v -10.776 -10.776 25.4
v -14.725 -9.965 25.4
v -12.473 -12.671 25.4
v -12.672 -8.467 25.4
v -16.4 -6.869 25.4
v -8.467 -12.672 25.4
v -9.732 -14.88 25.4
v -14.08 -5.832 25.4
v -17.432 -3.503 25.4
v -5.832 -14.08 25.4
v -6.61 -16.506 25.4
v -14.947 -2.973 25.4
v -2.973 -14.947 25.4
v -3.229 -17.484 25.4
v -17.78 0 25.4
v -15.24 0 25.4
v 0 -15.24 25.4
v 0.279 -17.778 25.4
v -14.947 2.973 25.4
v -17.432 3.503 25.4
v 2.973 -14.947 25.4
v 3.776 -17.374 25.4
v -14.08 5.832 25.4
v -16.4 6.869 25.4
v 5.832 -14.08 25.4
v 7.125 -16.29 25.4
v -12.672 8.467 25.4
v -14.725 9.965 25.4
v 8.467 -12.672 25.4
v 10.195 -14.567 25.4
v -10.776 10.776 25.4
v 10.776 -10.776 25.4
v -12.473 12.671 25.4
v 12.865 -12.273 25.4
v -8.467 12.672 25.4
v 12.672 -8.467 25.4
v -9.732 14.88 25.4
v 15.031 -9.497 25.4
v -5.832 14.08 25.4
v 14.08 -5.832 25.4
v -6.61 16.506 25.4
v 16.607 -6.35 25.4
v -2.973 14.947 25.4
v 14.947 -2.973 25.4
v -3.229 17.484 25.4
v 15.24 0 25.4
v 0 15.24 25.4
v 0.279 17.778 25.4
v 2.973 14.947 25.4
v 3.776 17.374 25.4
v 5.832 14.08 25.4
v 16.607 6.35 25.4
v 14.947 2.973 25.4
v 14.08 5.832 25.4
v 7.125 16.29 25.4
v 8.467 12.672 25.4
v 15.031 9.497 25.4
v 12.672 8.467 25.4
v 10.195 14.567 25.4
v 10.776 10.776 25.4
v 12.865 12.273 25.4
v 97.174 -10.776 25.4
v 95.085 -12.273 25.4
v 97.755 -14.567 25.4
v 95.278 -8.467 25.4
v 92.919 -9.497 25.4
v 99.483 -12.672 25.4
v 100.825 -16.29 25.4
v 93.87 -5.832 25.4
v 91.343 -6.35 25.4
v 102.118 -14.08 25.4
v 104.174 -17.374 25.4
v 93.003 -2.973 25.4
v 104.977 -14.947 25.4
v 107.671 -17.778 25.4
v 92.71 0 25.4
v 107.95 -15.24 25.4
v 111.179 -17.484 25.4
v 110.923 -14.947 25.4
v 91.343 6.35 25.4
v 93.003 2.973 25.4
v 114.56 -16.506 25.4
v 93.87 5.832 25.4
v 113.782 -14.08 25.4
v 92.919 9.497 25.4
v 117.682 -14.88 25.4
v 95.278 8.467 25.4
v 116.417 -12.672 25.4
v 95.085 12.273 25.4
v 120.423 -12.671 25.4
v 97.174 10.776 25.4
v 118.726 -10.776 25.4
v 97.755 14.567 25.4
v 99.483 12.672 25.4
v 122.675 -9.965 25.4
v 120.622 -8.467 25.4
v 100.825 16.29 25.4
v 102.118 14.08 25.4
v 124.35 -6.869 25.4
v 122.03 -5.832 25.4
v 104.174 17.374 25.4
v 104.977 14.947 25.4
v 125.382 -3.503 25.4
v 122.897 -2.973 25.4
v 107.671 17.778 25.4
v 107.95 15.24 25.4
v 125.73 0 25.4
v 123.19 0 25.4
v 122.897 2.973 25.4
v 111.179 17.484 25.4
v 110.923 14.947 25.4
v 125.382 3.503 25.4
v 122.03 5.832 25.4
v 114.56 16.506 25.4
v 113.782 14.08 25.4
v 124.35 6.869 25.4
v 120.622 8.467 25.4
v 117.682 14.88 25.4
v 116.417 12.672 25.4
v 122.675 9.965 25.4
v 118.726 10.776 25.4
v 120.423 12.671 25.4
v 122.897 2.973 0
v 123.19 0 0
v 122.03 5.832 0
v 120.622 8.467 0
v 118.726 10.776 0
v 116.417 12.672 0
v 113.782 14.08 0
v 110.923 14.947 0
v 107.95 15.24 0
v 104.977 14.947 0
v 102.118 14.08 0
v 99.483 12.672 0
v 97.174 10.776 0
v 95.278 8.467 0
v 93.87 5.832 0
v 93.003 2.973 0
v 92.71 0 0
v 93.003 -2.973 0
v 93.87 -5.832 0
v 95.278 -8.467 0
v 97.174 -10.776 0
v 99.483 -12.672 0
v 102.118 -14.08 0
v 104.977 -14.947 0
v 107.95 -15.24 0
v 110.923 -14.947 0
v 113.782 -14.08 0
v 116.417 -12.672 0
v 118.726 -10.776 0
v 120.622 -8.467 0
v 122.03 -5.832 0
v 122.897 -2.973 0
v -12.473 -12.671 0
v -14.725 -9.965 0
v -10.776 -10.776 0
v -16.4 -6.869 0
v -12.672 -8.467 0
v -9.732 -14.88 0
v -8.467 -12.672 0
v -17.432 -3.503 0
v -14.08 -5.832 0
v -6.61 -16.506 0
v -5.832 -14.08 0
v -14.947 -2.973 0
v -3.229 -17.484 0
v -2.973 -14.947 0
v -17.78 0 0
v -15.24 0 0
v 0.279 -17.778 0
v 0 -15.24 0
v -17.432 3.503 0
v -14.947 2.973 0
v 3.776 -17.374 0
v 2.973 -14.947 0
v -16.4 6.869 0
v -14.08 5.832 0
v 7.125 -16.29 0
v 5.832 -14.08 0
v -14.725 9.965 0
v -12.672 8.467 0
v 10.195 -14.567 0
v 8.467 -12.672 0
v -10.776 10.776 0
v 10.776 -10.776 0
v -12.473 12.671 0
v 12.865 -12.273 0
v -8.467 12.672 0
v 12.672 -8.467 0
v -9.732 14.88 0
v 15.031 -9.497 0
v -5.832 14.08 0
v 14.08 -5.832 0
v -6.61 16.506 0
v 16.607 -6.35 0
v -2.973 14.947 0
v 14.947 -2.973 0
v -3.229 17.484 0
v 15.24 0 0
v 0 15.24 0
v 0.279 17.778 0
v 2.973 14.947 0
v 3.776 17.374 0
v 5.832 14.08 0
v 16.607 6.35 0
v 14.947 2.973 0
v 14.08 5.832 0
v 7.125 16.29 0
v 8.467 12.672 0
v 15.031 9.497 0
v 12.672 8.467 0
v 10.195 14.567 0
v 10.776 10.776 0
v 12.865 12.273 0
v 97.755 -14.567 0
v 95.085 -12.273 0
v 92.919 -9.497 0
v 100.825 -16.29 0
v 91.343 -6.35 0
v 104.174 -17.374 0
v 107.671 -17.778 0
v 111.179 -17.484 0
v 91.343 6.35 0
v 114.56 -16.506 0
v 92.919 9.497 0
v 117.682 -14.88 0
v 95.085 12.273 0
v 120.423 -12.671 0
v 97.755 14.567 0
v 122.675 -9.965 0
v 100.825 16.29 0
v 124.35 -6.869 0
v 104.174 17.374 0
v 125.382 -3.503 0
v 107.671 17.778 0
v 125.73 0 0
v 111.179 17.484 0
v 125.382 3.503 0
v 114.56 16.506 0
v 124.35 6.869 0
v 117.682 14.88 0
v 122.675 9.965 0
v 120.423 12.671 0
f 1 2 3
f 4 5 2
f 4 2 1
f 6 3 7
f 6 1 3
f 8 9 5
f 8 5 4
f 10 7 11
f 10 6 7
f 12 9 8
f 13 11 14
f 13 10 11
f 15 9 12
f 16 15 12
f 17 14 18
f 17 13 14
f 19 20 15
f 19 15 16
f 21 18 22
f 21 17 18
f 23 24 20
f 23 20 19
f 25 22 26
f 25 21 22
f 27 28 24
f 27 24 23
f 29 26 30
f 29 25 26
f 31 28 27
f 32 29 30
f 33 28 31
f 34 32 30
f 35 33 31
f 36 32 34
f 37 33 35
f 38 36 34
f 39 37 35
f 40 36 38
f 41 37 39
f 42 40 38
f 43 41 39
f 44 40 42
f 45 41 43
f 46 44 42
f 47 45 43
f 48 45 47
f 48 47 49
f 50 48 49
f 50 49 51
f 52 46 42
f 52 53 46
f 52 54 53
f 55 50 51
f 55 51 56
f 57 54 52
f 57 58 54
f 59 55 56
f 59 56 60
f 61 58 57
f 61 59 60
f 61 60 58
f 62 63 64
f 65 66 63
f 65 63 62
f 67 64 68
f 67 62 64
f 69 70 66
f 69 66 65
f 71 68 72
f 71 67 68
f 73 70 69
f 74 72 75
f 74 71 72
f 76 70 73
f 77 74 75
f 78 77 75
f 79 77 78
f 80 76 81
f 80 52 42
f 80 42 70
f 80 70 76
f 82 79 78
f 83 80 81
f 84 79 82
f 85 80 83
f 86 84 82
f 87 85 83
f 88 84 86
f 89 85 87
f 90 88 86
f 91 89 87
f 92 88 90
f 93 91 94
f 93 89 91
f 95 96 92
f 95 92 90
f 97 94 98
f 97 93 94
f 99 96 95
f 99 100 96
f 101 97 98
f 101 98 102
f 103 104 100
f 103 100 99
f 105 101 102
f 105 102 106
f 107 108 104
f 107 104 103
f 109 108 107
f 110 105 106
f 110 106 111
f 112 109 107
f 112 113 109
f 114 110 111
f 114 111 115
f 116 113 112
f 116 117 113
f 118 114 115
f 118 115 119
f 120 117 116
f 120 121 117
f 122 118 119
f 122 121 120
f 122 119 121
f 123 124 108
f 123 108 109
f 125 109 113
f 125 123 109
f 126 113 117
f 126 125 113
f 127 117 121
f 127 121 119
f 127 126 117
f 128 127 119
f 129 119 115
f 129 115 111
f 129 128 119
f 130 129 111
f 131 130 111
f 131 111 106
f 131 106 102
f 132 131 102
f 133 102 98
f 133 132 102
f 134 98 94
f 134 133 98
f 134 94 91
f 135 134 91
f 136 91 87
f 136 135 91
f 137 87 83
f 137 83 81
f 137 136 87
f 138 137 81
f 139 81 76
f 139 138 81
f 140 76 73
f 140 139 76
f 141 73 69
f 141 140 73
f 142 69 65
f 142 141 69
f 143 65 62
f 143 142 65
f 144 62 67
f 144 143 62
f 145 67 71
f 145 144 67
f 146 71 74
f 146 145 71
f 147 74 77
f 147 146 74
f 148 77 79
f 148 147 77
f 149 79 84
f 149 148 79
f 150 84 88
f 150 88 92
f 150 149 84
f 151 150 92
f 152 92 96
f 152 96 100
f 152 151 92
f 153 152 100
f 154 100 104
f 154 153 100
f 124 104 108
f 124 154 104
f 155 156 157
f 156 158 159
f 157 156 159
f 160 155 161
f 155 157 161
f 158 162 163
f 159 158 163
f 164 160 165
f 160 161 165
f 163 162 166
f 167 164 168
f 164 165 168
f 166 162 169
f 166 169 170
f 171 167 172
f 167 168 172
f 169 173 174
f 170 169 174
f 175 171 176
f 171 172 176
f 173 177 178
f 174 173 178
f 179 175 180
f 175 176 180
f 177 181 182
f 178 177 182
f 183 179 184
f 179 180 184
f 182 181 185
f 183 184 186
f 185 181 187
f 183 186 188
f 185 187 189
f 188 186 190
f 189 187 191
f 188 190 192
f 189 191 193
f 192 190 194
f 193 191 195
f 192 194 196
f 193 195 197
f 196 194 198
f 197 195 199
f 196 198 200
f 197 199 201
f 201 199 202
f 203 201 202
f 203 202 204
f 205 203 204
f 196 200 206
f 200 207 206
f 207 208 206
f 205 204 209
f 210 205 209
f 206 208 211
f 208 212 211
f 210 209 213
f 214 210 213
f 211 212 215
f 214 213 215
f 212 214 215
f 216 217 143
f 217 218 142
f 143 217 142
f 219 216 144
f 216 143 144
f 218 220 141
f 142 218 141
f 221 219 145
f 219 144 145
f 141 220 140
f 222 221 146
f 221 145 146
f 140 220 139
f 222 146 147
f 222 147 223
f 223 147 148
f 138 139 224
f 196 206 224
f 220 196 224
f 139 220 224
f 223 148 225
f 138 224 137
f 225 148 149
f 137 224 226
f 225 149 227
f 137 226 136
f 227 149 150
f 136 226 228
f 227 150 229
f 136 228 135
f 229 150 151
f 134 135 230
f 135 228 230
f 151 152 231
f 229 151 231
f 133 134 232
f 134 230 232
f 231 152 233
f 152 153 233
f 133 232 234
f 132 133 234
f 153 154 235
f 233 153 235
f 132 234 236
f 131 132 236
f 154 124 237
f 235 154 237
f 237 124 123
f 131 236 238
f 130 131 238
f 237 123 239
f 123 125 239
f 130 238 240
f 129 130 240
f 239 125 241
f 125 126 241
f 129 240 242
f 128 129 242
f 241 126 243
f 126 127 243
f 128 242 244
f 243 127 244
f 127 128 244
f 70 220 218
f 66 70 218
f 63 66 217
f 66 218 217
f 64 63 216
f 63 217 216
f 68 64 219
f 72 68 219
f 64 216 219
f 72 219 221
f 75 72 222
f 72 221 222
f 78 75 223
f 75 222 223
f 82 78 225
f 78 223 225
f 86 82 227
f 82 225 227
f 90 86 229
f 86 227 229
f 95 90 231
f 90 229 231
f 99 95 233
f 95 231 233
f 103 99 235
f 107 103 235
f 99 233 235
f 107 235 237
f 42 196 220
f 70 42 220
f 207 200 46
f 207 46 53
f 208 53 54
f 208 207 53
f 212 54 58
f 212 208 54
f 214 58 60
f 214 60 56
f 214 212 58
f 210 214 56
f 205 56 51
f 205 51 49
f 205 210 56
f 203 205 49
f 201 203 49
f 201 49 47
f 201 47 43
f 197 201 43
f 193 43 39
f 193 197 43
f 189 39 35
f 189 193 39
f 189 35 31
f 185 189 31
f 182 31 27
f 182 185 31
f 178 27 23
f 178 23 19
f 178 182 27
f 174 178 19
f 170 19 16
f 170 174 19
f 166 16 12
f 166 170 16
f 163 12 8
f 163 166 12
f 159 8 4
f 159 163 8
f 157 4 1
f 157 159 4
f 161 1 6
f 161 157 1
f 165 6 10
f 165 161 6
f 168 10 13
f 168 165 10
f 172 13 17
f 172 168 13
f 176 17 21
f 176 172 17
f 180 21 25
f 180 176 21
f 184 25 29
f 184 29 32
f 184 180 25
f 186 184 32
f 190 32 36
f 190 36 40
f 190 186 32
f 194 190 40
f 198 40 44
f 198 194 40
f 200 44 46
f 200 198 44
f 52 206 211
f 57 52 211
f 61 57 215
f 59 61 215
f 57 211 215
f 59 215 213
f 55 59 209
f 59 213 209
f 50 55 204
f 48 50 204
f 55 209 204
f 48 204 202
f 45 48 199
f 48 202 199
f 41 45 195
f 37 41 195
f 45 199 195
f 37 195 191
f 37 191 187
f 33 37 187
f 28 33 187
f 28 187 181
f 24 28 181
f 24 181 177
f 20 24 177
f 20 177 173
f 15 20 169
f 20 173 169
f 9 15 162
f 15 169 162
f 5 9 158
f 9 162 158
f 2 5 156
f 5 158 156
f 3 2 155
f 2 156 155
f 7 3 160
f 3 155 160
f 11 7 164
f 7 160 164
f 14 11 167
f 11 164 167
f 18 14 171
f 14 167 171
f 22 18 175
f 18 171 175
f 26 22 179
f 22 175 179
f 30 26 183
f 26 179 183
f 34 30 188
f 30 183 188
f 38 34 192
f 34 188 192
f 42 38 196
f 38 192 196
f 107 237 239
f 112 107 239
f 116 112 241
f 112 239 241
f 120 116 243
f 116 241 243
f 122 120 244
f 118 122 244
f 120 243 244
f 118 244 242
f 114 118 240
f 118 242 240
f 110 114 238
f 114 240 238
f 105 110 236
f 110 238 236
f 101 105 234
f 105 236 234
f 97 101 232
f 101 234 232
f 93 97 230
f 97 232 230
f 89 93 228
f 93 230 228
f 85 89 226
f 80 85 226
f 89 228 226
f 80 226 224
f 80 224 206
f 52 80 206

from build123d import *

# Parameters (mm, degrees)
SKETCH1_R           = 15.24
BOSS_EXTRUDE1_DEPTH = 25.4


with BuildPart() as part:
    # Sketch1 → Boss-Extrude1 (new body)
    with BuildSketch(Plane.XY):
        with BuildLine():
            ThreePointArc((16.607404975, 6.35), (-17.78, 0), (16.607404975, -6.35))
            Line((16.607404975, -6.35), (16.607404975, 6.35))
        make_face()
        Circle(SKETCH1_R, mode=Mode.SUBTRACT)
        with BuildLine():
            Line((16.607404975, -6.35), (91.342595025, -6.35))
            ThreePointArc((91.342595025, -6.35), (90.17, 0), (91.342595025, 6.35))
            Line((91.342595025, 6.35), (16.607404975, 6.35))
            ThreePointArc((16.607404975, 6.35), (17.484393905, 3.228679261), (17.78, 0))
            ThreePointArc((17.78, 0), (17.484393905, -3.228679261), (16.607404975, -6.35))
        make_face()
        with BuildLine():
            Line((16.607404975, 6.35), (16.607404975, -6.35))
            ThreePointArc((16.607404975, -6.35), (17.484393905, -3.228679261), (17.78, 0))
            ThreePointArc((17.78, 0), (17.484393905, 3.228679261), (16.607404975, 6.35))
        make_face()
        with BuildLine():
            Line((91.342595025, 6.35), (91.342595025, -6.35))
            ThreePointArc((91.342595025, -6.35), (111.178679261, -17.484393905), (125.73, 0))
            ThreePointArc((125.73, 0), (111.178679261, 17.484393905), (91.342595025, 6.35))
        make_face()
        with Locations((107.95, 0)):
            Circle(SKETCH1_R, mode=Mode.SUBTRACT)
        with BuildLine():
            ThreePointArc((91.342595025, 6.35), (90.17, 0), (91.342595025, -6.35))
            Line((91.342595025, -6.35), (91.342595025, 6.35))
        make_face()
    extrude(amount=BOSS_EXTRUDE1_DEPTH)


solid = part.part
